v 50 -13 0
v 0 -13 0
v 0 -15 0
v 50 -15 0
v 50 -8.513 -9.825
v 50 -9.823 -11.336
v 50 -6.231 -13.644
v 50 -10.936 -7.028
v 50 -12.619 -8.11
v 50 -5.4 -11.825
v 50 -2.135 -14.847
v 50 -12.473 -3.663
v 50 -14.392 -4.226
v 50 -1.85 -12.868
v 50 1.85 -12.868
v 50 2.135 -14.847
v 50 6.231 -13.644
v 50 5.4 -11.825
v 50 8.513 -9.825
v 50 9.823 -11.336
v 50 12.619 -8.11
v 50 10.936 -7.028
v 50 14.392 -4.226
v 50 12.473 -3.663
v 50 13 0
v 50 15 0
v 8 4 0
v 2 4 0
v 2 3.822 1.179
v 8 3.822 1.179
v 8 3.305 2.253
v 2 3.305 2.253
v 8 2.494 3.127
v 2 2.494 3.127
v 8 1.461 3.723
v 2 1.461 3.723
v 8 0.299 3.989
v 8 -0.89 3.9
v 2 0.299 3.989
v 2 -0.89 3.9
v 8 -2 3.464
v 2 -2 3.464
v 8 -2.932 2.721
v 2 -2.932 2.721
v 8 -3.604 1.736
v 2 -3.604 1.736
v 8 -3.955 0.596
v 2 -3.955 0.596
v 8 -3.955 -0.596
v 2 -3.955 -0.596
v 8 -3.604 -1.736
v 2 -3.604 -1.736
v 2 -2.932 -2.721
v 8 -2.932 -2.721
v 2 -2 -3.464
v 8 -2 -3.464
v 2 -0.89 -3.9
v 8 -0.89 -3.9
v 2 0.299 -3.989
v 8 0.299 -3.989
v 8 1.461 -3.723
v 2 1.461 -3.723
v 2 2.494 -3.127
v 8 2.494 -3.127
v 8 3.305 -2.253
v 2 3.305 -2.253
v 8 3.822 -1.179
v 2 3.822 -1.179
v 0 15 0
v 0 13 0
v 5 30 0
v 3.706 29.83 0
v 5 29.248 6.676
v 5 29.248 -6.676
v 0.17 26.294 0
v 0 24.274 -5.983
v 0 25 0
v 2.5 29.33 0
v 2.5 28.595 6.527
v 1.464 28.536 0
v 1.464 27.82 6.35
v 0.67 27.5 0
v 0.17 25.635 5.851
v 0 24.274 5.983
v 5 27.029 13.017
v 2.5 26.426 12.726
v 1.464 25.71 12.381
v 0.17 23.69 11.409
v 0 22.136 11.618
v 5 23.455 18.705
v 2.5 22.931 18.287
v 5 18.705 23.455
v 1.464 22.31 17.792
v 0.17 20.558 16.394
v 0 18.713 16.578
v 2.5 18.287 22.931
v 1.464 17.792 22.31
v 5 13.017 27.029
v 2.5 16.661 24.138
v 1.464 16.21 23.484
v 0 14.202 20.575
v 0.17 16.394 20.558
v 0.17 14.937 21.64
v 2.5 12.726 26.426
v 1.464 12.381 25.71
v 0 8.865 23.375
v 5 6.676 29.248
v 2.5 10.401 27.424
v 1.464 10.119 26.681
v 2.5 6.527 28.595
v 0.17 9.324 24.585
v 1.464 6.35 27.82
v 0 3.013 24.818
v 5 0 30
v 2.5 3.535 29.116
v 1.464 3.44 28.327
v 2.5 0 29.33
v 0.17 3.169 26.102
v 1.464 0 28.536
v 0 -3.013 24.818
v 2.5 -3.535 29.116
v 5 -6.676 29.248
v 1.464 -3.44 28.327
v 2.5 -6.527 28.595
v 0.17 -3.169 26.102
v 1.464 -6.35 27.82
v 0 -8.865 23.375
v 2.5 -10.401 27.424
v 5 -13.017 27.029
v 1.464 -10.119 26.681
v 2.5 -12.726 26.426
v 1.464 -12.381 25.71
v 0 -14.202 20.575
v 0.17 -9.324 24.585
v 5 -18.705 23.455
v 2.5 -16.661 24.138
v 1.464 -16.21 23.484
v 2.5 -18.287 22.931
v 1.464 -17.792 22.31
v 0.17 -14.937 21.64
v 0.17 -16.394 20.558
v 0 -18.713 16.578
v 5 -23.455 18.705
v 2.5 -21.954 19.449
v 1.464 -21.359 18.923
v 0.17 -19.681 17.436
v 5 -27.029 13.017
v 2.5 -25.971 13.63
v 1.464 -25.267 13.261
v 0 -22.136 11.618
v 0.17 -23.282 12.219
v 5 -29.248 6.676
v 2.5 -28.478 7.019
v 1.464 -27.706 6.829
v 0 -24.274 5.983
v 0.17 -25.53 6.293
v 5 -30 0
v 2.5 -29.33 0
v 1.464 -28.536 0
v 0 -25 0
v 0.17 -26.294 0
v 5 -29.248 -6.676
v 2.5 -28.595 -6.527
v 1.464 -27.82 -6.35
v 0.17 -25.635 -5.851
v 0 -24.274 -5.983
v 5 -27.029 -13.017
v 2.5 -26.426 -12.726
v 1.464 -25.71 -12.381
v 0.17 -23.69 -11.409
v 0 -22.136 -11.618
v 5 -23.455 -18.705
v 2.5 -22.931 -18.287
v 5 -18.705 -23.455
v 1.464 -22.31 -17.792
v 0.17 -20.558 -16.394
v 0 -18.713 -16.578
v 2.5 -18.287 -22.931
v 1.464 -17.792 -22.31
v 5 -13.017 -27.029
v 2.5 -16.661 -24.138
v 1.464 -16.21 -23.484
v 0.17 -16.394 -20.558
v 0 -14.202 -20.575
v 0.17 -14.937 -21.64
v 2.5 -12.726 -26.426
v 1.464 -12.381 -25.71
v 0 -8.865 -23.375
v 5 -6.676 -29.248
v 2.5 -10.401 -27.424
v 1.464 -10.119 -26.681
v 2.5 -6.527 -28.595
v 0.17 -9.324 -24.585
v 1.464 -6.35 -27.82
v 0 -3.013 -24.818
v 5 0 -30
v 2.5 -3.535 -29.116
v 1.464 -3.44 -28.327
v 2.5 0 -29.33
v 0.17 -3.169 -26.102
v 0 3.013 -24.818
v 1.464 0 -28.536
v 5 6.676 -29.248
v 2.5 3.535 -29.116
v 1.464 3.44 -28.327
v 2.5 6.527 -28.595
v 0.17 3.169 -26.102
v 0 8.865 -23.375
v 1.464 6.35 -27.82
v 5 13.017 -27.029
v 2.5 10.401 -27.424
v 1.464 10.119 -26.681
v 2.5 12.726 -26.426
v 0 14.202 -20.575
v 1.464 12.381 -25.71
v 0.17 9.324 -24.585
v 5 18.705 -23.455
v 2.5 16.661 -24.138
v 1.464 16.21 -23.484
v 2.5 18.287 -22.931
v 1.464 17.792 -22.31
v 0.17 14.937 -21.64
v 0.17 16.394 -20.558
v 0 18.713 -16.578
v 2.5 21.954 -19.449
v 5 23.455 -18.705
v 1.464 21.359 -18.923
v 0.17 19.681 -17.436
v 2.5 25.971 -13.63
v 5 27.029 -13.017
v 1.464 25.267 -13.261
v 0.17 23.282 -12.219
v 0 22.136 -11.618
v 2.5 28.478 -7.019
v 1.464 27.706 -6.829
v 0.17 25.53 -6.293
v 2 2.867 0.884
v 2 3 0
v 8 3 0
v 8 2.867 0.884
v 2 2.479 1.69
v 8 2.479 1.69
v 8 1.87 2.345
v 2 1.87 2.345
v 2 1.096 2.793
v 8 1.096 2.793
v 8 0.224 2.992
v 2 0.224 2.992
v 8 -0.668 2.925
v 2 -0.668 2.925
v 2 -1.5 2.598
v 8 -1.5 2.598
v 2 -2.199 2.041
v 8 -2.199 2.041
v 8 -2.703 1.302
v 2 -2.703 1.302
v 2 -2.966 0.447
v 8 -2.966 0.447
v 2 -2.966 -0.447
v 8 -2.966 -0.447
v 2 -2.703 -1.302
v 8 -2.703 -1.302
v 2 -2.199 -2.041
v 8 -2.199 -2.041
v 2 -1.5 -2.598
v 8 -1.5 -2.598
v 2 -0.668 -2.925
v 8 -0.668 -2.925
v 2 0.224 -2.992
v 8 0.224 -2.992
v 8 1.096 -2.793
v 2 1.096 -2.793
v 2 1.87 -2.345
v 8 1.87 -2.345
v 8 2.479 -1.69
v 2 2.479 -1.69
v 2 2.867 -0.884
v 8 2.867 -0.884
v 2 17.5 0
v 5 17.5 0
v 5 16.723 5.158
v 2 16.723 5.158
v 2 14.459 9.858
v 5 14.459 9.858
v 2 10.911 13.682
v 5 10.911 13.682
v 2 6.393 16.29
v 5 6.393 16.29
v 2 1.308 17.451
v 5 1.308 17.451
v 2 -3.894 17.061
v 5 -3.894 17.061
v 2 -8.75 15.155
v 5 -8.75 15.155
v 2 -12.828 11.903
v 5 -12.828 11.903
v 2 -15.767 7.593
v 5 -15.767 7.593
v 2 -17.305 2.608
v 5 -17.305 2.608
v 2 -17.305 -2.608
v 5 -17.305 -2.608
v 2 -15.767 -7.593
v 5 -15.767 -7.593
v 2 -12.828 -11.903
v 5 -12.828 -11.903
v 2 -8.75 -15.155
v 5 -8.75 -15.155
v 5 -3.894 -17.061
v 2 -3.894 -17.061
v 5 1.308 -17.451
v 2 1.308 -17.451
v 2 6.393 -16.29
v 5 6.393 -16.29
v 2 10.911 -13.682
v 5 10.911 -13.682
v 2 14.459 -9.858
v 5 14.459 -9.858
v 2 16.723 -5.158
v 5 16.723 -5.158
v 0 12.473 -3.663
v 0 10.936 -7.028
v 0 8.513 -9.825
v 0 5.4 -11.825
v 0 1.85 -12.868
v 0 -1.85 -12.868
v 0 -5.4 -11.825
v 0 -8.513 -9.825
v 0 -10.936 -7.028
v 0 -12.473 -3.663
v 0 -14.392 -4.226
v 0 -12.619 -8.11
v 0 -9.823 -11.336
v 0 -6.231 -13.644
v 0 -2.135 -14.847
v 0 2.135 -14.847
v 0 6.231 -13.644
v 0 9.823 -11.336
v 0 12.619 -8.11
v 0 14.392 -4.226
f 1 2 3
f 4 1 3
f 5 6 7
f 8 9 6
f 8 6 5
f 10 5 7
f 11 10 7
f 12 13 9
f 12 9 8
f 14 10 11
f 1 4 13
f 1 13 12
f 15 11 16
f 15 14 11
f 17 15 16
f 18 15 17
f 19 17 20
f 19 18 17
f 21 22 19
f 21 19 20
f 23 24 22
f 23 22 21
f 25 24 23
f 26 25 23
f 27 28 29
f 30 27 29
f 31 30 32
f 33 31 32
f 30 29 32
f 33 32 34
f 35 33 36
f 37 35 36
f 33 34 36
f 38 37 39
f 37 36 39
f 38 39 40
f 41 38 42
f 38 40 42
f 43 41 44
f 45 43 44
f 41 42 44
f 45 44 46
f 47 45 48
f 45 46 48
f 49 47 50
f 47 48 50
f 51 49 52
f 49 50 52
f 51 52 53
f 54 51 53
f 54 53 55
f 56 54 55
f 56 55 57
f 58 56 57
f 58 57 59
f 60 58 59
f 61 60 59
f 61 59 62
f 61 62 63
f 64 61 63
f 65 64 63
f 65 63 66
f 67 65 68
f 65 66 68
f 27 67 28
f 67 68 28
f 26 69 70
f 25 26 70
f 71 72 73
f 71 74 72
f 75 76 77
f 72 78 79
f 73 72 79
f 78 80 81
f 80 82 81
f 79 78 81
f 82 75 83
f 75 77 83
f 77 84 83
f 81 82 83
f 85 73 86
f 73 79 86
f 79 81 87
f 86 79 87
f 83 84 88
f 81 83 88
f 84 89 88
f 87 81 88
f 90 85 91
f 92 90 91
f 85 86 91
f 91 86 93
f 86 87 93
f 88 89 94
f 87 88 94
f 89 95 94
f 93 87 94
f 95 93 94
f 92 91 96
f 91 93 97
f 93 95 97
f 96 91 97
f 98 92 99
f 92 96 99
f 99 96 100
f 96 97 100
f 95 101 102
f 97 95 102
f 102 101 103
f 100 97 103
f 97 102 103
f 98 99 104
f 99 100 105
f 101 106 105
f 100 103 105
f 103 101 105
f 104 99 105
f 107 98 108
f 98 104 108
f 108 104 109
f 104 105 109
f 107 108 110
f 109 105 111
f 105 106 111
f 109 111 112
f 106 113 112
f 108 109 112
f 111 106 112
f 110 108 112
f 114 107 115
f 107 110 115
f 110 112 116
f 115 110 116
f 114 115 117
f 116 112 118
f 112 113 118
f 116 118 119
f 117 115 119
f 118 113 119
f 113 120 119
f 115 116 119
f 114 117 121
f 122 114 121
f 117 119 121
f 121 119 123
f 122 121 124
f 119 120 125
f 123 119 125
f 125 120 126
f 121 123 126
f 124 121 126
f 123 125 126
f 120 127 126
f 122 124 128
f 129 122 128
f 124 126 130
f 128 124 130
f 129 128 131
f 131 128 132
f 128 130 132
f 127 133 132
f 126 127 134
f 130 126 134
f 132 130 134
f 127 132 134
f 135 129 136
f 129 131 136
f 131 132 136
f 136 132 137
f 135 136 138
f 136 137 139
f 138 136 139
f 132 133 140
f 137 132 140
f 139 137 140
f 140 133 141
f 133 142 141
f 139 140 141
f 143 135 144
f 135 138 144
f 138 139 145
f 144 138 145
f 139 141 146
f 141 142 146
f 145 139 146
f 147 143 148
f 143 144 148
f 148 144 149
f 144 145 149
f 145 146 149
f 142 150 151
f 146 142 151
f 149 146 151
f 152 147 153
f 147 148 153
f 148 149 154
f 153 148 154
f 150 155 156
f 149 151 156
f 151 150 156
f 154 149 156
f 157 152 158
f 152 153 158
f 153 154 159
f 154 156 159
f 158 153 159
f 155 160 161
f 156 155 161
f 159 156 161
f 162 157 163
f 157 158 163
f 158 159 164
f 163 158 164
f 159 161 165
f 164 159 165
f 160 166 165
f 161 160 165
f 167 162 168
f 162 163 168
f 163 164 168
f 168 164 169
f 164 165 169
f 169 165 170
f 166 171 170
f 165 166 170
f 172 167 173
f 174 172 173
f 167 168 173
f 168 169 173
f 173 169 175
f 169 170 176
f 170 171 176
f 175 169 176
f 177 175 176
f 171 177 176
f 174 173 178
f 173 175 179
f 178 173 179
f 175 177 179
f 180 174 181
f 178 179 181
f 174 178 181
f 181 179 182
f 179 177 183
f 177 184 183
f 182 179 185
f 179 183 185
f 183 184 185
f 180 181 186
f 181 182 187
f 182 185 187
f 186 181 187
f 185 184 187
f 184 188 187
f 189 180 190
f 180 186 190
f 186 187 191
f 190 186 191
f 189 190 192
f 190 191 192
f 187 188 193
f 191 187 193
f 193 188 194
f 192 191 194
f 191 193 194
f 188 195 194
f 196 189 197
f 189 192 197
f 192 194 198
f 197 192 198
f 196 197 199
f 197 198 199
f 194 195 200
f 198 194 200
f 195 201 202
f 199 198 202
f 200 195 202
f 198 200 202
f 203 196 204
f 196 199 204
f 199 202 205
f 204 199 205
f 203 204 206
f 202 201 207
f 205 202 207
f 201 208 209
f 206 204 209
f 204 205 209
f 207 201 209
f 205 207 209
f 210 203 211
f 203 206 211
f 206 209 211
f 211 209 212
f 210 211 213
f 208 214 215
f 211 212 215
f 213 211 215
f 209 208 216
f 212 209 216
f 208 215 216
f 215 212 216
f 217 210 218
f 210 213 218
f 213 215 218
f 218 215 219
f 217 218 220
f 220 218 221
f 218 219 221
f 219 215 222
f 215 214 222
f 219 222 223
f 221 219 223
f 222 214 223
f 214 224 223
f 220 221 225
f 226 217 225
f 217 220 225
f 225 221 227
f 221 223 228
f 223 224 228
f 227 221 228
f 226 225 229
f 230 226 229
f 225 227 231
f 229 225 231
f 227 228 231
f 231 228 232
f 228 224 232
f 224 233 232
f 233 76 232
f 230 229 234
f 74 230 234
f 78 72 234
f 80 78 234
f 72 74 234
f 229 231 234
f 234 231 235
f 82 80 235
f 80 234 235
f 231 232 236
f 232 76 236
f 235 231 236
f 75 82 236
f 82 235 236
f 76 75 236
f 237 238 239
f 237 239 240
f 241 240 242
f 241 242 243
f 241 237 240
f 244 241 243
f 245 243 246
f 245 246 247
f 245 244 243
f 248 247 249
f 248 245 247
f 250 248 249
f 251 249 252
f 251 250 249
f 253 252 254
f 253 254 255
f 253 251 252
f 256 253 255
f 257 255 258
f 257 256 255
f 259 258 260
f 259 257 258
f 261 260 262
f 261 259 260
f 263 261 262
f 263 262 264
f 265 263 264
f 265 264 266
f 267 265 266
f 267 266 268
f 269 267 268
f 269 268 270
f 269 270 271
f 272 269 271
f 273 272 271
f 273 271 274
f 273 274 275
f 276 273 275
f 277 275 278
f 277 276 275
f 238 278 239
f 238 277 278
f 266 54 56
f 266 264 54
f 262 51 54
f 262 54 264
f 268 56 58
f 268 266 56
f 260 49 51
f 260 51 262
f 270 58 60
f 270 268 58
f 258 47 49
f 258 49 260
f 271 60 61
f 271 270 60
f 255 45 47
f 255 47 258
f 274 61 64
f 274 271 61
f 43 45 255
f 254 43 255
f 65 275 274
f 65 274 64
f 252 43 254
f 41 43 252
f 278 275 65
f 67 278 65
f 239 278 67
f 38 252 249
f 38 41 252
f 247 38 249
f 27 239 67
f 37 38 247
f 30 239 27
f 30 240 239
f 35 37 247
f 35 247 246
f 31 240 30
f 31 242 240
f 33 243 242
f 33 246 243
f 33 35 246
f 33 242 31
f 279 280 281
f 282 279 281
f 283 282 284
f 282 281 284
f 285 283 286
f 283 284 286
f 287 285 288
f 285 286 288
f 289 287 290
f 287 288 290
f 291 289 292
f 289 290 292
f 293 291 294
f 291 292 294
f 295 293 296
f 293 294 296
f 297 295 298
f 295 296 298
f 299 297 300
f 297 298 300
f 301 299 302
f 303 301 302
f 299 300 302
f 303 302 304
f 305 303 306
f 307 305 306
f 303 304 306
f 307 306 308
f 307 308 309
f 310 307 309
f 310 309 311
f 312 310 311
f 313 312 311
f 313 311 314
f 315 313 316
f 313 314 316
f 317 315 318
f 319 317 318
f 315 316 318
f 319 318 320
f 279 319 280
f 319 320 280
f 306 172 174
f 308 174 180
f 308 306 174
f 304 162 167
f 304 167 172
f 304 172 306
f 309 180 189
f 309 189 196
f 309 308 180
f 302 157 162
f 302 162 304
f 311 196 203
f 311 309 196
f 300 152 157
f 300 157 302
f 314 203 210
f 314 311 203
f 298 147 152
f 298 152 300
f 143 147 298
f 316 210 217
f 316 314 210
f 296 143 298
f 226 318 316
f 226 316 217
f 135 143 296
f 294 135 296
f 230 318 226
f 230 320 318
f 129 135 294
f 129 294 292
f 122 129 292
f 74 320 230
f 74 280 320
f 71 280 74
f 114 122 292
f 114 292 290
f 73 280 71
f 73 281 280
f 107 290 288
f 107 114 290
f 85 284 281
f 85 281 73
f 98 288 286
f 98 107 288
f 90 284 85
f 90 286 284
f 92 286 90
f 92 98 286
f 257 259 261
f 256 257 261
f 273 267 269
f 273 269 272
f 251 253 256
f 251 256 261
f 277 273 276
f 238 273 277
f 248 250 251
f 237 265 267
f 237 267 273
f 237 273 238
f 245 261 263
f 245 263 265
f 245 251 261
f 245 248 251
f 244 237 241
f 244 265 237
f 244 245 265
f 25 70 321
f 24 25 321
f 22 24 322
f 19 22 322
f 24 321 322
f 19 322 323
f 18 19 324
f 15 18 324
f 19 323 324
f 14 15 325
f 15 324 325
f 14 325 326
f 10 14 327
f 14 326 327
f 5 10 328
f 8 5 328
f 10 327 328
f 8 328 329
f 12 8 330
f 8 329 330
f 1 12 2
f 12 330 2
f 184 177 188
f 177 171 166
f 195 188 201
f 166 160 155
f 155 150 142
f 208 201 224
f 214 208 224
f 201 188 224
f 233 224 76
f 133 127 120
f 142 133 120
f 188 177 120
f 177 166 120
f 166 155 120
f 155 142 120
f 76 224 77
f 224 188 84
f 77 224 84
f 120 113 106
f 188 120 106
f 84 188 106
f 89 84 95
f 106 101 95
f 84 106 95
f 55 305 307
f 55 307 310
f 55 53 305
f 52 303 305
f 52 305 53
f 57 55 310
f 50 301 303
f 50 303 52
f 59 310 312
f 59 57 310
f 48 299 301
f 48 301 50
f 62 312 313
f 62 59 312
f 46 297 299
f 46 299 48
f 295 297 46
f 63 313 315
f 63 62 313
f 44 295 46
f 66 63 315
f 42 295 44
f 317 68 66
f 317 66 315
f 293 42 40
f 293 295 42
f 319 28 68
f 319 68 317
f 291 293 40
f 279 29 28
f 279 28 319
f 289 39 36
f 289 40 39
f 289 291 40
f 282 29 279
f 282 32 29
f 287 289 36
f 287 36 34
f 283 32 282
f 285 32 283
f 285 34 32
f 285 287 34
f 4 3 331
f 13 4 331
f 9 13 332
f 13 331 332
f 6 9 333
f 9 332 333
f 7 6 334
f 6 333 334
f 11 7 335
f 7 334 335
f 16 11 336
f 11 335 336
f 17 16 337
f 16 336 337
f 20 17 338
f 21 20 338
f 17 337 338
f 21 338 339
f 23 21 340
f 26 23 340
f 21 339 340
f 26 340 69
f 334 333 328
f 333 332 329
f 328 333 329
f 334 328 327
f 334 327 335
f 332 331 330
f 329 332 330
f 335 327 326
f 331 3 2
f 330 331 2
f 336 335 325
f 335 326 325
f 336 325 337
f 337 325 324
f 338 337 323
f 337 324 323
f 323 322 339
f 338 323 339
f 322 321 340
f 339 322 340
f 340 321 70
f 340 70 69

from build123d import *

# Parameters (mm, degrees)
F0_R     = 30
F1_DEPTH = 5
F2_R     = 4.99999
F3_R     = 17.5
F4_DEPTH = 3
F5_R     = 4
F5_R_2   = 3
F6_DEPTH = 6
F8_DEPTH = 50


# Not quite as in the source:
# - a fillet or chamfer is up to 0.001 mm smaller than in the source, because OpenCascade refuses the exact size


with BuildPart() as f1:
    # F0 (on Right) → F1 (new body)
    with BuildSketch(Plane.YZ):
        Circle(F0_R)
    extrude(amount=F1_DEPTH)

    # F2 (radius 5 in the source; OpenCascade refuses exactly that, so slightly less here)
    f2_edges = [f1.edges().sort_by_distance(p)[0] for p in [
        (0, -30, 0),
    ]]
    fillet(f2_edges, radius=F2_R)

    # F3 (on face) → F4 (cut)
    with BuildSketch(Plane.YZ.offset(5)):
        Circle(F3_R)
    extrude(amount=-F4_DEPTH, mode=Mode.SUBTRACT)

    # F5 (on face) → F6 (join)
    with BuildSketch(Plane.YZ.offset(2)):
        Circle(F5_R)
        Circle(F5_R_2, mode=Mode.SUBTRACT)
    extrude(amount=F6_DEPTH)


with BuildPart() as f8:
    # F7 (on Right) → F8 (new body)
    with BuildSketch(Plane.YZ):
        with BuildLine():
            Line((-13, 0), (-15, 0))
            ThreePointArc((-15, 0), (0, -15), (15, 0))
            Line((15, 0), (13, 0))
            ThreePointArc((13, 0), (0, -13), (-13, 0))
        make_face()
    extrude(amount=F8_DEPTH)


solid = Compound([f1.part, f8.part])
